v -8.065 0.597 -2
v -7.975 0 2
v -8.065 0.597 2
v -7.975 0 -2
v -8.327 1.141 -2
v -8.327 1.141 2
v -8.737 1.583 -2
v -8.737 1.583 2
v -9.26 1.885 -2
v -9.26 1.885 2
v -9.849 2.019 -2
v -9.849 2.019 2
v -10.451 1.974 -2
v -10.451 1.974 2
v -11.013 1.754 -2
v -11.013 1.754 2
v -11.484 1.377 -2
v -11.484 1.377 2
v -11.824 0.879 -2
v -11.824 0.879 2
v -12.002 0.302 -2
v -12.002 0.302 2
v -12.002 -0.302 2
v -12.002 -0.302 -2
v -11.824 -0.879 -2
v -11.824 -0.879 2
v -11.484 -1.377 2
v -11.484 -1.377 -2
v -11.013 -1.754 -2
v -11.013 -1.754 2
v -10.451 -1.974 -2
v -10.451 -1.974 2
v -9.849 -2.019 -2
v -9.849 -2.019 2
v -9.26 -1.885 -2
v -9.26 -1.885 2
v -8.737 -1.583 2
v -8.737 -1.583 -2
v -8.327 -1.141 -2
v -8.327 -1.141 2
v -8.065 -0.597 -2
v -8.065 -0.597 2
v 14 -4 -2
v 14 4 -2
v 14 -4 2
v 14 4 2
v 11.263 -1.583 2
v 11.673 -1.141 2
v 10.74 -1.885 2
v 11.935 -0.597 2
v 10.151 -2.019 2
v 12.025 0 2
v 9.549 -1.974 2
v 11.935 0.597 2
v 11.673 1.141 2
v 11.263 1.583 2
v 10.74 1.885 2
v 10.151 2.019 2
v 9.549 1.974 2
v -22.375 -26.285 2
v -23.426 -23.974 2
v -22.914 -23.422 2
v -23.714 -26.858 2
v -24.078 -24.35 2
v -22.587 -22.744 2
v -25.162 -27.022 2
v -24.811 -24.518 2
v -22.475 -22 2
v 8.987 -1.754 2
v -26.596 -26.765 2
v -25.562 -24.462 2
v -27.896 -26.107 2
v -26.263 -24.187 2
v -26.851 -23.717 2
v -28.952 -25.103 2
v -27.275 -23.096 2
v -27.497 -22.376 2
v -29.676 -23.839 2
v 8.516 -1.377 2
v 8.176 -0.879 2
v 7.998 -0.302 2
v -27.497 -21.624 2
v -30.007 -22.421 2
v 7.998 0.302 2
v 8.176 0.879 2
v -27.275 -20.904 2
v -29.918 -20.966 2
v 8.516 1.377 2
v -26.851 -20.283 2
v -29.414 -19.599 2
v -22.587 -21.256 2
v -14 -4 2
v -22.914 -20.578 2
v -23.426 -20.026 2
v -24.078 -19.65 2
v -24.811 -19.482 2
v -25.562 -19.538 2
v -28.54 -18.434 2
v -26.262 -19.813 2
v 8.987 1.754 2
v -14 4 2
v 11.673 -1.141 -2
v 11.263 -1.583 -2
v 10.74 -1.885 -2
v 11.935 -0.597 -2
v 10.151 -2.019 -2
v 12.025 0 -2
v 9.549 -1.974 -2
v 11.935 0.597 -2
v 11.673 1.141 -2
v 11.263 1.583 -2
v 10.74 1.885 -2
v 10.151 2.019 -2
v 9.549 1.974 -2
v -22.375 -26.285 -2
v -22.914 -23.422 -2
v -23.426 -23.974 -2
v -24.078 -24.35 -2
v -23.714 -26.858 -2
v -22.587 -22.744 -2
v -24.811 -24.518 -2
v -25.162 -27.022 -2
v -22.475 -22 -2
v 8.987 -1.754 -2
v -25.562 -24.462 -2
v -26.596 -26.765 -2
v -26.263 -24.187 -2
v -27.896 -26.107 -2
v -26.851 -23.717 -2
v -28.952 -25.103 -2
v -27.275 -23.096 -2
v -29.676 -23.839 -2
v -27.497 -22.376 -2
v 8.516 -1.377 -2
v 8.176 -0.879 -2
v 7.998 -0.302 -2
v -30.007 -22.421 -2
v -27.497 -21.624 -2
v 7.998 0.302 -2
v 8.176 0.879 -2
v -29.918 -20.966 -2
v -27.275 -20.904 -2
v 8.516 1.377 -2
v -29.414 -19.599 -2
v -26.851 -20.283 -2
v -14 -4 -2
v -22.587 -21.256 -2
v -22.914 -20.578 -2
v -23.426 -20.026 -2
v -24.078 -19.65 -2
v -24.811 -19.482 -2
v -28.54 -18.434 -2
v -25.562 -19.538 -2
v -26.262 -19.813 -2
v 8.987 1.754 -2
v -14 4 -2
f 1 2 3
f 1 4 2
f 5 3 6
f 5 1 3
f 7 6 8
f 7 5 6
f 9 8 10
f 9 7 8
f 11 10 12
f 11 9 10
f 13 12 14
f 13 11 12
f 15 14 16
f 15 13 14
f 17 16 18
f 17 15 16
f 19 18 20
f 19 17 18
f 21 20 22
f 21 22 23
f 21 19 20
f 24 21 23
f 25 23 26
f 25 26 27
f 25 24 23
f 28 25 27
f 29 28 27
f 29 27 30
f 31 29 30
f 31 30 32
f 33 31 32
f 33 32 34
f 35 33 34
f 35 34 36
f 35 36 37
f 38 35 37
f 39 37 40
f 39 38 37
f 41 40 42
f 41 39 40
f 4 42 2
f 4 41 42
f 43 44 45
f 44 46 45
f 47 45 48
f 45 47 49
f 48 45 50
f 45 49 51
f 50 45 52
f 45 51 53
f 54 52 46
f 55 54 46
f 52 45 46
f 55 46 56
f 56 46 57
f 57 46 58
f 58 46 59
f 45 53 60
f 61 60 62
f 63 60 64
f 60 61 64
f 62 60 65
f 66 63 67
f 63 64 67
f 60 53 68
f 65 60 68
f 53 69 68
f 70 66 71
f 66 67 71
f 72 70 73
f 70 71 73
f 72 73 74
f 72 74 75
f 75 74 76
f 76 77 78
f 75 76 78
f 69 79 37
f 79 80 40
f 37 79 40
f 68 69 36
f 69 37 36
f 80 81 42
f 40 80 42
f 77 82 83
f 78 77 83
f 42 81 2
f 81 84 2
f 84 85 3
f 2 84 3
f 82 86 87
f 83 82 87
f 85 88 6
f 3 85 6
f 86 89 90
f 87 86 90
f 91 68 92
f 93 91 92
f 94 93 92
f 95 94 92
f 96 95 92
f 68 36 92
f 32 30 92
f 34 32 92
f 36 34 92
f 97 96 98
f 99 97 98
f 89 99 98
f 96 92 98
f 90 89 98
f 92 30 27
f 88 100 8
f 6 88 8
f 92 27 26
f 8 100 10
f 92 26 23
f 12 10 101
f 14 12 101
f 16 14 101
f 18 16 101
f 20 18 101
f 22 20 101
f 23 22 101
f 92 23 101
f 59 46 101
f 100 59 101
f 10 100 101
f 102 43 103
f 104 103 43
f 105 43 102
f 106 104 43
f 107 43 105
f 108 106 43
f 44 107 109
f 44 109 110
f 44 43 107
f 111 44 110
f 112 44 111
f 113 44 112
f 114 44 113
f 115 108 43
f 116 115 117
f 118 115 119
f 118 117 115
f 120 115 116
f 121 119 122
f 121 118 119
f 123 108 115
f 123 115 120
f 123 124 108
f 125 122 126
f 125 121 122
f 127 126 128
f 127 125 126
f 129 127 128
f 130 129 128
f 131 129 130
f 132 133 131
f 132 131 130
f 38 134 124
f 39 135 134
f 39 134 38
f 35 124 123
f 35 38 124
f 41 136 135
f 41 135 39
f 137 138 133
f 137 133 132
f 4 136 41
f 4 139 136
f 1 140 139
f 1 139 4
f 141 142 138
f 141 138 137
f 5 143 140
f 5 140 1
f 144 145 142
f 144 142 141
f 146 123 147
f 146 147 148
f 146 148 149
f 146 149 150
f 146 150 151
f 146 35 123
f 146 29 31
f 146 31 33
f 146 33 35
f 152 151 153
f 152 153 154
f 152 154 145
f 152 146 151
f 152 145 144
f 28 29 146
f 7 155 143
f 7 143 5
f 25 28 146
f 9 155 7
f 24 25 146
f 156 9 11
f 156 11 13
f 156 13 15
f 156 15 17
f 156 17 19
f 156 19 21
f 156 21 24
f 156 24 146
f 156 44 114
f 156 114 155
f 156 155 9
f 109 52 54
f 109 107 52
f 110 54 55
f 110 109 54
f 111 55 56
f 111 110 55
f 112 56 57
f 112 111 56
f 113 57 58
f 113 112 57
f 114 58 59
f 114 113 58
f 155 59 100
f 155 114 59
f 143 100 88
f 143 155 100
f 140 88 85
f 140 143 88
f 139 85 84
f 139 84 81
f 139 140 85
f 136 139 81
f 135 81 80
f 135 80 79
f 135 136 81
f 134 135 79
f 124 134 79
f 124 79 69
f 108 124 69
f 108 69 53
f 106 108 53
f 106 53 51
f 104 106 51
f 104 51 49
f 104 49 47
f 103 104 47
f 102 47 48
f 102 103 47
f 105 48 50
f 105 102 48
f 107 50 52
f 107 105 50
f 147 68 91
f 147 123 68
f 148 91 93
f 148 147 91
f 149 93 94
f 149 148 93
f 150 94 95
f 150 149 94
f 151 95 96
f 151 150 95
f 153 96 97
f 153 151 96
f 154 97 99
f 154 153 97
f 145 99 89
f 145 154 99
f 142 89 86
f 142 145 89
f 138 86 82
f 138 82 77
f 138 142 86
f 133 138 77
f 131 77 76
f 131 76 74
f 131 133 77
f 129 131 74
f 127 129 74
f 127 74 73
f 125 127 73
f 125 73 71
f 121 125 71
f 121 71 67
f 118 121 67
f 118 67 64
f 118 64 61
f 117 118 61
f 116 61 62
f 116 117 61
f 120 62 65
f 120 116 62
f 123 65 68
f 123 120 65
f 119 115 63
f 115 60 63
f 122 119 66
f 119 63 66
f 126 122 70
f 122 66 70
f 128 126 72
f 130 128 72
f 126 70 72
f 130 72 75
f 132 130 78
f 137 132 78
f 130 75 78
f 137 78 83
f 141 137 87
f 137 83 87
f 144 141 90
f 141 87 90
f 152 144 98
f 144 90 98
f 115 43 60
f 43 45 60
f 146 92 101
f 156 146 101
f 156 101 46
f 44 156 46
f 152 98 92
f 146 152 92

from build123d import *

# Parameters (mm, degrees)
SKETCH_1_R      = 2.025
SKETCH_1_R_2    = 2.525
EXTRUDE_1_DEPTH = 2


with BuildPart() as part:
    # 草图1 → 凸台-拉伸1 (new, symmetric)
    with BuildSketch(Plane.XY):
        with BuildLine():
            Line((-14, 4), (14, 4))
            Line((14, 4), (14, -4))
            Line((14, -4), (-22.374938993, -26.284819682))
            ThreePointArc((-22.374938993, -26.284819682), (-28.952100704, -25.103469836), (-28.540142401, -18.433767144))
            Line((-28.540142401, -18.433767144), (-14, -4))
            Line((-14, -4), (-14, 4))
        make_face()
        with Locations((10, 0)):
            Circle(SKETCH_1_R, mode=Mode.SUBTRACT)
        with Locations((-10, 0)):
            Circle(SKETCH_1_R, mode=Mode.SUBTRACT)
        with Locations((-25, -22)):
            Circle(SKETCH_1_R_2, mode=Mode.SUBTRACT)
    extrude(amount=EXTRUDE_1_DEPTH, both=True)


solid = part.part
